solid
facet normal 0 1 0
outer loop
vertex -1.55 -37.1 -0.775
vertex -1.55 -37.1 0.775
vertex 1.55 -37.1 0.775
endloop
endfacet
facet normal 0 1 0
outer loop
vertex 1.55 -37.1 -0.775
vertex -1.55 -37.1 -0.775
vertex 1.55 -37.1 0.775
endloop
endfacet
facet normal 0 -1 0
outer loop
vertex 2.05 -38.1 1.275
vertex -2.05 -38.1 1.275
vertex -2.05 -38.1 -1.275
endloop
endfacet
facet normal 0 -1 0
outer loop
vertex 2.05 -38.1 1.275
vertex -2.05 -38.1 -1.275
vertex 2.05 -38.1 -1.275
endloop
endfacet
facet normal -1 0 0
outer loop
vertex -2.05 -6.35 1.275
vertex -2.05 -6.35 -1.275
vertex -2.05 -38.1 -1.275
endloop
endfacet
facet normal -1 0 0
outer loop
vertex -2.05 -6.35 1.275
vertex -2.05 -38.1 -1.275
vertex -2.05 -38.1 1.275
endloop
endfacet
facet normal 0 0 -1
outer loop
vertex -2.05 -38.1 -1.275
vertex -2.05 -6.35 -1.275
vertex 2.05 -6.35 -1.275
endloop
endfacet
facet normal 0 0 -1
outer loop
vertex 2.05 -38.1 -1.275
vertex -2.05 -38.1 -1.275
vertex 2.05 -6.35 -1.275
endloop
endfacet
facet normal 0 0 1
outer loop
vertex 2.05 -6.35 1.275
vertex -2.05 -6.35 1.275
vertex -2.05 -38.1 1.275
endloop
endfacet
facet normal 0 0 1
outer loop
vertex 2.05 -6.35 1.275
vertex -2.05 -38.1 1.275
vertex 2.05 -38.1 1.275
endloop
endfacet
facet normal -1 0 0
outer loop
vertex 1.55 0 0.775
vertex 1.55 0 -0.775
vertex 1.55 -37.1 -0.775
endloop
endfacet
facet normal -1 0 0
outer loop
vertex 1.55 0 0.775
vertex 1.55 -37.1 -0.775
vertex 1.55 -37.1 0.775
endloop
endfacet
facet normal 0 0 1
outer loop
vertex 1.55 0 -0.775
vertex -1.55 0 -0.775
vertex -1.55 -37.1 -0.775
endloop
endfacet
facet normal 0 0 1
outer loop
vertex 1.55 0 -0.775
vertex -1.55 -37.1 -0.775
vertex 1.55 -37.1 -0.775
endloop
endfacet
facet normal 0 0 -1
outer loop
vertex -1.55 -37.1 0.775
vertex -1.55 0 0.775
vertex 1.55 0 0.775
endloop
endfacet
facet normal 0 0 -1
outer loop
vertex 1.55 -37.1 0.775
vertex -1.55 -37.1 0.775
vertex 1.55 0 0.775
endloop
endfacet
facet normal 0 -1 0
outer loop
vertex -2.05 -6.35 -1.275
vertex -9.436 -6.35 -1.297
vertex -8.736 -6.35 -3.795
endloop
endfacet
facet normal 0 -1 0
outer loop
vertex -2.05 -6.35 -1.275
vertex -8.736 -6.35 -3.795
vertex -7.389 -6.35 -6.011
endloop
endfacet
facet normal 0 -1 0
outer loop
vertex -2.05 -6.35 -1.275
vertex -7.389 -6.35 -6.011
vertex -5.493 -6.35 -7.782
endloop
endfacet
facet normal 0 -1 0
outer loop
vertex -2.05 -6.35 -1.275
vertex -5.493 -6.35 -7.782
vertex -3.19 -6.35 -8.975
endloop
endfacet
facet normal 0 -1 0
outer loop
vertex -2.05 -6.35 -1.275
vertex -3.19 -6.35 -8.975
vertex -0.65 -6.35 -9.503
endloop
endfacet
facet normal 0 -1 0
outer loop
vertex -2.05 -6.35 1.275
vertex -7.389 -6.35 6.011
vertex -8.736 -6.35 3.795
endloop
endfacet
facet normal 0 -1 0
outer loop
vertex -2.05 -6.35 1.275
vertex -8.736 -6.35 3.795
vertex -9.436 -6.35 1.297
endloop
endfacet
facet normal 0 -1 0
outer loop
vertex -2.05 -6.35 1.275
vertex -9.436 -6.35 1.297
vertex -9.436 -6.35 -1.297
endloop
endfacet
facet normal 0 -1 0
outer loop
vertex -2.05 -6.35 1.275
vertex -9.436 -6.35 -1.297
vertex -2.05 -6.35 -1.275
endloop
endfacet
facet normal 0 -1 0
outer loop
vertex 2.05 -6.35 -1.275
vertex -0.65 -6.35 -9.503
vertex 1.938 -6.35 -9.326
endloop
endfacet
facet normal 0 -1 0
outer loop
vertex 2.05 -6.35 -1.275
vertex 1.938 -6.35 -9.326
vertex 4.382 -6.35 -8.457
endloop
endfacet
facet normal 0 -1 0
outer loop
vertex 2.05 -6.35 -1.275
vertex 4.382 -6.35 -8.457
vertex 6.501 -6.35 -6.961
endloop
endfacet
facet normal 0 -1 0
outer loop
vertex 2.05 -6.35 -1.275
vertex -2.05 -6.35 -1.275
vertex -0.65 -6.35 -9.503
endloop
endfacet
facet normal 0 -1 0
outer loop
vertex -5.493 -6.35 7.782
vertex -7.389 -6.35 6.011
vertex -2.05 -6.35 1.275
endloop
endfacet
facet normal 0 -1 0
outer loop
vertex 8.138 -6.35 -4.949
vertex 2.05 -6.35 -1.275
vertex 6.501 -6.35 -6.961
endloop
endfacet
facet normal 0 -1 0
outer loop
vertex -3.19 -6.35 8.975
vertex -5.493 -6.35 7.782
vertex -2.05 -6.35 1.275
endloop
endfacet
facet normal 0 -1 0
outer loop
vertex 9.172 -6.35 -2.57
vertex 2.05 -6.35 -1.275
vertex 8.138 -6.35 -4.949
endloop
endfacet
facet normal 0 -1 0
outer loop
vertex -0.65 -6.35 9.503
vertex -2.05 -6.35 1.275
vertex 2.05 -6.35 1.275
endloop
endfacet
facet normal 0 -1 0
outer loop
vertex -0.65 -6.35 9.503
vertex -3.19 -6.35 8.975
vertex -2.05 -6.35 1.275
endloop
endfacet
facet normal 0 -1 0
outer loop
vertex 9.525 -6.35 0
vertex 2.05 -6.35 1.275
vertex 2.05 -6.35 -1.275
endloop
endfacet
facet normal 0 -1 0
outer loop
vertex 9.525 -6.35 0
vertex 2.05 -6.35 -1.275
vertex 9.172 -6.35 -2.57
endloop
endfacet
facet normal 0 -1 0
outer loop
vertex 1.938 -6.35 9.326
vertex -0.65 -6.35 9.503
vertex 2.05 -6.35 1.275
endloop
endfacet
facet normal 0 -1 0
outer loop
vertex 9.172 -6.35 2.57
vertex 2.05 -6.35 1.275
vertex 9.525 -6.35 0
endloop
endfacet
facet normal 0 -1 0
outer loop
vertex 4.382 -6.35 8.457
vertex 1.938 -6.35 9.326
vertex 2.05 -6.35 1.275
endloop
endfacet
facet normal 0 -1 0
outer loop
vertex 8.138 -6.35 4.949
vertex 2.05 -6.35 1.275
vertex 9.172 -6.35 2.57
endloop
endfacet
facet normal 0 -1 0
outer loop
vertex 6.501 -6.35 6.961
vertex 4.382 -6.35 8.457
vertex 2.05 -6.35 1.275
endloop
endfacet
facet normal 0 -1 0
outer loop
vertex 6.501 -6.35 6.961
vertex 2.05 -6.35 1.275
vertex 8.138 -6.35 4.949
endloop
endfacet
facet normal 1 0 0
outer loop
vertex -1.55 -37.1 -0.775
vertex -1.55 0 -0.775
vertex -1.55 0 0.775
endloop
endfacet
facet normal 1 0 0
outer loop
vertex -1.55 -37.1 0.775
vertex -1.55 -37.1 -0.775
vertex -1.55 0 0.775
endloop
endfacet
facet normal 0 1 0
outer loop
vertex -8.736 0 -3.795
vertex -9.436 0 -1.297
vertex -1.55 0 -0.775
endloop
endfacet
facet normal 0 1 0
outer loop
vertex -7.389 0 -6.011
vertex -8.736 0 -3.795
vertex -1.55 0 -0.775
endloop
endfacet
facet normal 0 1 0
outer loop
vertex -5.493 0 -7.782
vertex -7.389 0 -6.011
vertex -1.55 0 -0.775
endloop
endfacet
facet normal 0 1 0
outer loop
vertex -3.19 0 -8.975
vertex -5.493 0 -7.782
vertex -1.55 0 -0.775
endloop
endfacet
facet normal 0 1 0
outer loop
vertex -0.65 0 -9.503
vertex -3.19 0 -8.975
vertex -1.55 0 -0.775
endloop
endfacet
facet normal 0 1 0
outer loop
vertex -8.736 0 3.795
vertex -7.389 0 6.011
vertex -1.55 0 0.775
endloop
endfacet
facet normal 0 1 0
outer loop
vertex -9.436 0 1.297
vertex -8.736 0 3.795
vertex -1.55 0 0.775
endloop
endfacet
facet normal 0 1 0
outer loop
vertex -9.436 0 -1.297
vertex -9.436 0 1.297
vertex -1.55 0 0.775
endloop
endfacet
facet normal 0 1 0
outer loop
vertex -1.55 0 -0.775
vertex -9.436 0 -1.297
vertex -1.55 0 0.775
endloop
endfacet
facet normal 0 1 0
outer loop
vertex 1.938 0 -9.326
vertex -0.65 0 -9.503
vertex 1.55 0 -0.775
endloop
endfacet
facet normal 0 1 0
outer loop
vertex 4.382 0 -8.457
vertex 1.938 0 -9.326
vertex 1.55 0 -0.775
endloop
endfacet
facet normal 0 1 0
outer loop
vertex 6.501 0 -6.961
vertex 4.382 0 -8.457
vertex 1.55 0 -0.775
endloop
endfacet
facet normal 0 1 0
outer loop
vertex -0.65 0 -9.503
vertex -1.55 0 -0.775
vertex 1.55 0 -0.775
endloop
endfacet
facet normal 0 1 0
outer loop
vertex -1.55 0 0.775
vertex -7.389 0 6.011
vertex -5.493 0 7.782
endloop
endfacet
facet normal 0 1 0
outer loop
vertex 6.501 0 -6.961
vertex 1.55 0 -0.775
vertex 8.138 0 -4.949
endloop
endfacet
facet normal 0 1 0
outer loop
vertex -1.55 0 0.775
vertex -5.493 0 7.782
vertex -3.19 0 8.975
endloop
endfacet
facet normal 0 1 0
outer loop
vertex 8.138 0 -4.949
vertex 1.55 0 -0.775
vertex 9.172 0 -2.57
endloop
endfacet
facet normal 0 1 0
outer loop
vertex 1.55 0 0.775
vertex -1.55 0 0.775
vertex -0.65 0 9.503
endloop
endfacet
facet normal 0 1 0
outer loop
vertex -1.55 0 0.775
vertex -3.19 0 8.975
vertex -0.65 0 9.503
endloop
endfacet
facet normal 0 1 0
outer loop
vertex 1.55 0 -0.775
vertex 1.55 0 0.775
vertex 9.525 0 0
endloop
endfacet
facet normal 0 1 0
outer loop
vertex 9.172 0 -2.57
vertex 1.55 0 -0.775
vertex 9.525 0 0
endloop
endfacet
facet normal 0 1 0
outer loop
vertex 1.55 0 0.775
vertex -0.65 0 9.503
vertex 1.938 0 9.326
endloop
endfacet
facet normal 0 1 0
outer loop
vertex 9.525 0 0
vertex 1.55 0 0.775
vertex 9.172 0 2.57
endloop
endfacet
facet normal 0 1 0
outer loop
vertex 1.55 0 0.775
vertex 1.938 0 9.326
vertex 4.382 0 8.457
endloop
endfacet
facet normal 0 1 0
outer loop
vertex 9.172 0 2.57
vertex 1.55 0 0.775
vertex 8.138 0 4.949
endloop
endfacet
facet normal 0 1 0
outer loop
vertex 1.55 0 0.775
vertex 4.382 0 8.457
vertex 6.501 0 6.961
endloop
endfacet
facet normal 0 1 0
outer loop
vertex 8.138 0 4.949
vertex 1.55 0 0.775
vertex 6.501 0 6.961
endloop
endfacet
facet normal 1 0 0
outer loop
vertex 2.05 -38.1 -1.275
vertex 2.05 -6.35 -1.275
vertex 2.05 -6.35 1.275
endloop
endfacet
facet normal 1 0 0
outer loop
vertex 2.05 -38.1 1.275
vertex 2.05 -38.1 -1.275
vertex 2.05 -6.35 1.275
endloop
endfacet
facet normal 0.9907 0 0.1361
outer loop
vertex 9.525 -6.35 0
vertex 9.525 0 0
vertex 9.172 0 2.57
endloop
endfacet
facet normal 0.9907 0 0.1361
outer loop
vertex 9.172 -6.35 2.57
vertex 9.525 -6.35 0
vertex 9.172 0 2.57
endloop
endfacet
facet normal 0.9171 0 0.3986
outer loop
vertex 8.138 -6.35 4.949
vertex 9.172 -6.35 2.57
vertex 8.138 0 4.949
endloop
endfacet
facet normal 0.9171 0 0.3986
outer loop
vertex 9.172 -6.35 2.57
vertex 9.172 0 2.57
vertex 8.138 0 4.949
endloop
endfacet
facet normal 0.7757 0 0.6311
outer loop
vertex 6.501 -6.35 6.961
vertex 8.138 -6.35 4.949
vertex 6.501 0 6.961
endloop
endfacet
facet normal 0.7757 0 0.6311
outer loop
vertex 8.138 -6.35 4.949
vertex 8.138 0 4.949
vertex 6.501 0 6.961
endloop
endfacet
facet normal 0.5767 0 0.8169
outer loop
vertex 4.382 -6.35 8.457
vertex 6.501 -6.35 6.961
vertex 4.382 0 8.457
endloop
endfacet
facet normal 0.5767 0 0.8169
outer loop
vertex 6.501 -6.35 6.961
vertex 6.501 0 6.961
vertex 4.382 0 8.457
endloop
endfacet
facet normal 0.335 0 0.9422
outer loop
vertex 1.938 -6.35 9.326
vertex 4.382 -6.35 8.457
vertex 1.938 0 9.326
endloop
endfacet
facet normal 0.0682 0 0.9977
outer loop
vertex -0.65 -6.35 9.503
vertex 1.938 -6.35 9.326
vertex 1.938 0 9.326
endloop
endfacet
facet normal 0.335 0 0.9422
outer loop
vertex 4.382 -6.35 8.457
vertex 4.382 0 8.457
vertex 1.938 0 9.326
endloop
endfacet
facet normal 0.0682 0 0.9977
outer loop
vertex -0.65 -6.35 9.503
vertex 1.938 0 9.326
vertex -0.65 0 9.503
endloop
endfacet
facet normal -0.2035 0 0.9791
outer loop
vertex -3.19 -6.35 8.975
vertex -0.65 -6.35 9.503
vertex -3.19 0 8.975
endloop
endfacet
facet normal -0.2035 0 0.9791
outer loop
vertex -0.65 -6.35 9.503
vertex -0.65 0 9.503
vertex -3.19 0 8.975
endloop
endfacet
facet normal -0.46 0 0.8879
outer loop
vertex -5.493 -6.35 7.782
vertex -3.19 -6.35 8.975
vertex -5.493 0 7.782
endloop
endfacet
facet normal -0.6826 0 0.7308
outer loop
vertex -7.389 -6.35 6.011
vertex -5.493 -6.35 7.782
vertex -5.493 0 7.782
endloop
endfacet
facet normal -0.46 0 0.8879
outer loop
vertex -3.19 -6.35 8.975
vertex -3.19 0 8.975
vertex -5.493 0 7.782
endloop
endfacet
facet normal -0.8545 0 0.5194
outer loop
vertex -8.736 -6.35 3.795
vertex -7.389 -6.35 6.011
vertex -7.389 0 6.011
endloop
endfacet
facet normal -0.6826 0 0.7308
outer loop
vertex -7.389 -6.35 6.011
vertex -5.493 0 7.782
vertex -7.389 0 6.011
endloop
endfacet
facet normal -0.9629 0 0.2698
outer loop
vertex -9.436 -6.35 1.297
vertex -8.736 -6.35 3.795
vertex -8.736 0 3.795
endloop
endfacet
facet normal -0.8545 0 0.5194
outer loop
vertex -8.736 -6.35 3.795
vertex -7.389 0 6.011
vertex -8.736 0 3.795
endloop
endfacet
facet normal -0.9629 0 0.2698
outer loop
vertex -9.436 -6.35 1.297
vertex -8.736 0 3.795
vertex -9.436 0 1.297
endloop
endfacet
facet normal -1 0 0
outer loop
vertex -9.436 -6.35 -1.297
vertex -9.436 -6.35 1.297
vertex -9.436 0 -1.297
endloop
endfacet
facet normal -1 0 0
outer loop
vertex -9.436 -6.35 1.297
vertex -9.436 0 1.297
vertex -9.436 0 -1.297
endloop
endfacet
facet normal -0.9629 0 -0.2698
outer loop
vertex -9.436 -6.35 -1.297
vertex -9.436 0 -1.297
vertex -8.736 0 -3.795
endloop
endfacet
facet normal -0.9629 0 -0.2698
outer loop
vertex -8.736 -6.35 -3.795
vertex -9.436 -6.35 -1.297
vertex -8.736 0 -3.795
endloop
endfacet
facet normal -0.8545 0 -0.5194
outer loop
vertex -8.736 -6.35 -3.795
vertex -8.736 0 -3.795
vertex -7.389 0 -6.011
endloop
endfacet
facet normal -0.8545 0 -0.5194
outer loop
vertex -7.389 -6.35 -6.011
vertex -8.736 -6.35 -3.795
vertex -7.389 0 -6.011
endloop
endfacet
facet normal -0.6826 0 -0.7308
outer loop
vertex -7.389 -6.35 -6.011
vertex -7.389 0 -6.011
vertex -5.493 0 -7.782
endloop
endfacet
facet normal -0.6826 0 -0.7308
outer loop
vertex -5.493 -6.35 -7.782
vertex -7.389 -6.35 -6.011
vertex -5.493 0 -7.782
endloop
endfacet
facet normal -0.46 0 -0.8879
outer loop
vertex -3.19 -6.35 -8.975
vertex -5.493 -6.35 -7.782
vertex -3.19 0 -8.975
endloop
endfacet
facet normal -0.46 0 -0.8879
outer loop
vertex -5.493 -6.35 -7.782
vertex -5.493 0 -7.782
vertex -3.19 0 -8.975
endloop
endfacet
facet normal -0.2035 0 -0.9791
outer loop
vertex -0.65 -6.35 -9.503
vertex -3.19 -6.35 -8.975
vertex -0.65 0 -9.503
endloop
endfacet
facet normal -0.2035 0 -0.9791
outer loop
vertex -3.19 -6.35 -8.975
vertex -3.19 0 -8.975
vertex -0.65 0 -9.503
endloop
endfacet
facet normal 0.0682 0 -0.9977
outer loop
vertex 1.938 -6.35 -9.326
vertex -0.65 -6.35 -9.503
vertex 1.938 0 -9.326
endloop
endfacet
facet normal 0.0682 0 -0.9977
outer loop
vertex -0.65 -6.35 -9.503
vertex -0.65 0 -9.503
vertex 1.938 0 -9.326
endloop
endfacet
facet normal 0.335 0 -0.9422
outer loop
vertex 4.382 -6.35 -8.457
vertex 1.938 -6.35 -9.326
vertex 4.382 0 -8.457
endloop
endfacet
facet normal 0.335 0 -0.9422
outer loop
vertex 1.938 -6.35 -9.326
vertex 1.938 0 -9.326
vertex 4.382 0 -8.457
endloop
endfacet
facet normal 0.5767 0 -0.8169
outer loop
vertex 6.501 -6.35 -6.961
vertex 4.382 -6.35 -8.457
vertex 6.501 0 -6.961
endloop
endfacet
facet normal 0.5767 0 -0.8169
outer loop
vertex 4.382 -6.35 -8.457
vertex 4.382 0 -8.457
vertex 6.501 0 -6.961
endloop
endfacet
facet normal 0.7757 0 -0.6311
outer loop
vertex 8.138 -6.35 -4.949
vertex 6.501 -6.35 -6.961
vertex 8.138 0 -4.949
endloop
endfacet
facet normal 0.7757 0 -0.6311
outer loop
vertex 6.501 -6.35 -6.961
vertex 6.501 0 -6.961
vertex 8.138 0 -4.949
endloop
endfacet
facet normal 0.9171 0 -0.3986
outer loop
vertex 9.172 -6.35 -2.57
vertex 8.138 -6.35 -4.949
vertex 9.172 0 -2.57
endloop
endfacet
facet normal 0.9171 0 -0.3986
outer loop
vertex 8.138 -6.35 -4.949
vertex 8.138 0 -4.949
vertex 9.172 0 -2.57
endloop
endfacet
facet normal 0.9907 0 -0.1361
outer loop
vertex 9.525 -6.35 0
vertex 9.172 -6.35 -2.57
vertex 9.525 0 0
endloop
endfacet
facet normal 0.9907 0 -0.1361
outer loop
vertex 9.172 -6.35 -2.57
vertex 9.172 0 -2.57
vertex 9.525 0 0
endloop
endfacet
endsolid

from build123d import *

# Parameters (mm, degrees)
F0_W     = 4.1
F0_H     = 2.55
F0_W_2   = 3.1
F0_H_2   = 1.55
F1_DEPTH = 38.1
F0_R     = 9.525
F2_DEPTH = 6.35
F3_W     = 4.1
F3_H     = 2.55
F3_W_2   = 3.1
F3_H_2   = 1.55
F4_DEPTH = 1


with BuildPart() as f1:
    # F0 (on Front) → F1 (new body)
    with BuildSketch(Plane.XZ):
        Rectangle(F0_W, F0_H)
        Rectangle(F0_W_2, F0_H_2, mode=Mode.SUBTRACT)
    extrude(amount=F1_DEPTH)

    # F0 (on Front) → F2 (join)
    with BuildSketch(Plane.XZ):
        Circle(F0_R)
        Rectangle(F0_W, F0_H, mode=Mode.SUBTRACT)
    extrude(amount=F2_DEPTH)

    # F3 (on face) → F4 (join)
    with BuildSketch(Plane.XZ.offset(38.1)):
        Rectangle(F3_W, F3_H)
        Rectangle(F3_W_2, F3_H_2, mode=Mode.SUBTRACT)
        Rectangle(F3_W_2, F3_H_2)
    extrude(amount=-F4_DEPTH)


solid = f1.part
